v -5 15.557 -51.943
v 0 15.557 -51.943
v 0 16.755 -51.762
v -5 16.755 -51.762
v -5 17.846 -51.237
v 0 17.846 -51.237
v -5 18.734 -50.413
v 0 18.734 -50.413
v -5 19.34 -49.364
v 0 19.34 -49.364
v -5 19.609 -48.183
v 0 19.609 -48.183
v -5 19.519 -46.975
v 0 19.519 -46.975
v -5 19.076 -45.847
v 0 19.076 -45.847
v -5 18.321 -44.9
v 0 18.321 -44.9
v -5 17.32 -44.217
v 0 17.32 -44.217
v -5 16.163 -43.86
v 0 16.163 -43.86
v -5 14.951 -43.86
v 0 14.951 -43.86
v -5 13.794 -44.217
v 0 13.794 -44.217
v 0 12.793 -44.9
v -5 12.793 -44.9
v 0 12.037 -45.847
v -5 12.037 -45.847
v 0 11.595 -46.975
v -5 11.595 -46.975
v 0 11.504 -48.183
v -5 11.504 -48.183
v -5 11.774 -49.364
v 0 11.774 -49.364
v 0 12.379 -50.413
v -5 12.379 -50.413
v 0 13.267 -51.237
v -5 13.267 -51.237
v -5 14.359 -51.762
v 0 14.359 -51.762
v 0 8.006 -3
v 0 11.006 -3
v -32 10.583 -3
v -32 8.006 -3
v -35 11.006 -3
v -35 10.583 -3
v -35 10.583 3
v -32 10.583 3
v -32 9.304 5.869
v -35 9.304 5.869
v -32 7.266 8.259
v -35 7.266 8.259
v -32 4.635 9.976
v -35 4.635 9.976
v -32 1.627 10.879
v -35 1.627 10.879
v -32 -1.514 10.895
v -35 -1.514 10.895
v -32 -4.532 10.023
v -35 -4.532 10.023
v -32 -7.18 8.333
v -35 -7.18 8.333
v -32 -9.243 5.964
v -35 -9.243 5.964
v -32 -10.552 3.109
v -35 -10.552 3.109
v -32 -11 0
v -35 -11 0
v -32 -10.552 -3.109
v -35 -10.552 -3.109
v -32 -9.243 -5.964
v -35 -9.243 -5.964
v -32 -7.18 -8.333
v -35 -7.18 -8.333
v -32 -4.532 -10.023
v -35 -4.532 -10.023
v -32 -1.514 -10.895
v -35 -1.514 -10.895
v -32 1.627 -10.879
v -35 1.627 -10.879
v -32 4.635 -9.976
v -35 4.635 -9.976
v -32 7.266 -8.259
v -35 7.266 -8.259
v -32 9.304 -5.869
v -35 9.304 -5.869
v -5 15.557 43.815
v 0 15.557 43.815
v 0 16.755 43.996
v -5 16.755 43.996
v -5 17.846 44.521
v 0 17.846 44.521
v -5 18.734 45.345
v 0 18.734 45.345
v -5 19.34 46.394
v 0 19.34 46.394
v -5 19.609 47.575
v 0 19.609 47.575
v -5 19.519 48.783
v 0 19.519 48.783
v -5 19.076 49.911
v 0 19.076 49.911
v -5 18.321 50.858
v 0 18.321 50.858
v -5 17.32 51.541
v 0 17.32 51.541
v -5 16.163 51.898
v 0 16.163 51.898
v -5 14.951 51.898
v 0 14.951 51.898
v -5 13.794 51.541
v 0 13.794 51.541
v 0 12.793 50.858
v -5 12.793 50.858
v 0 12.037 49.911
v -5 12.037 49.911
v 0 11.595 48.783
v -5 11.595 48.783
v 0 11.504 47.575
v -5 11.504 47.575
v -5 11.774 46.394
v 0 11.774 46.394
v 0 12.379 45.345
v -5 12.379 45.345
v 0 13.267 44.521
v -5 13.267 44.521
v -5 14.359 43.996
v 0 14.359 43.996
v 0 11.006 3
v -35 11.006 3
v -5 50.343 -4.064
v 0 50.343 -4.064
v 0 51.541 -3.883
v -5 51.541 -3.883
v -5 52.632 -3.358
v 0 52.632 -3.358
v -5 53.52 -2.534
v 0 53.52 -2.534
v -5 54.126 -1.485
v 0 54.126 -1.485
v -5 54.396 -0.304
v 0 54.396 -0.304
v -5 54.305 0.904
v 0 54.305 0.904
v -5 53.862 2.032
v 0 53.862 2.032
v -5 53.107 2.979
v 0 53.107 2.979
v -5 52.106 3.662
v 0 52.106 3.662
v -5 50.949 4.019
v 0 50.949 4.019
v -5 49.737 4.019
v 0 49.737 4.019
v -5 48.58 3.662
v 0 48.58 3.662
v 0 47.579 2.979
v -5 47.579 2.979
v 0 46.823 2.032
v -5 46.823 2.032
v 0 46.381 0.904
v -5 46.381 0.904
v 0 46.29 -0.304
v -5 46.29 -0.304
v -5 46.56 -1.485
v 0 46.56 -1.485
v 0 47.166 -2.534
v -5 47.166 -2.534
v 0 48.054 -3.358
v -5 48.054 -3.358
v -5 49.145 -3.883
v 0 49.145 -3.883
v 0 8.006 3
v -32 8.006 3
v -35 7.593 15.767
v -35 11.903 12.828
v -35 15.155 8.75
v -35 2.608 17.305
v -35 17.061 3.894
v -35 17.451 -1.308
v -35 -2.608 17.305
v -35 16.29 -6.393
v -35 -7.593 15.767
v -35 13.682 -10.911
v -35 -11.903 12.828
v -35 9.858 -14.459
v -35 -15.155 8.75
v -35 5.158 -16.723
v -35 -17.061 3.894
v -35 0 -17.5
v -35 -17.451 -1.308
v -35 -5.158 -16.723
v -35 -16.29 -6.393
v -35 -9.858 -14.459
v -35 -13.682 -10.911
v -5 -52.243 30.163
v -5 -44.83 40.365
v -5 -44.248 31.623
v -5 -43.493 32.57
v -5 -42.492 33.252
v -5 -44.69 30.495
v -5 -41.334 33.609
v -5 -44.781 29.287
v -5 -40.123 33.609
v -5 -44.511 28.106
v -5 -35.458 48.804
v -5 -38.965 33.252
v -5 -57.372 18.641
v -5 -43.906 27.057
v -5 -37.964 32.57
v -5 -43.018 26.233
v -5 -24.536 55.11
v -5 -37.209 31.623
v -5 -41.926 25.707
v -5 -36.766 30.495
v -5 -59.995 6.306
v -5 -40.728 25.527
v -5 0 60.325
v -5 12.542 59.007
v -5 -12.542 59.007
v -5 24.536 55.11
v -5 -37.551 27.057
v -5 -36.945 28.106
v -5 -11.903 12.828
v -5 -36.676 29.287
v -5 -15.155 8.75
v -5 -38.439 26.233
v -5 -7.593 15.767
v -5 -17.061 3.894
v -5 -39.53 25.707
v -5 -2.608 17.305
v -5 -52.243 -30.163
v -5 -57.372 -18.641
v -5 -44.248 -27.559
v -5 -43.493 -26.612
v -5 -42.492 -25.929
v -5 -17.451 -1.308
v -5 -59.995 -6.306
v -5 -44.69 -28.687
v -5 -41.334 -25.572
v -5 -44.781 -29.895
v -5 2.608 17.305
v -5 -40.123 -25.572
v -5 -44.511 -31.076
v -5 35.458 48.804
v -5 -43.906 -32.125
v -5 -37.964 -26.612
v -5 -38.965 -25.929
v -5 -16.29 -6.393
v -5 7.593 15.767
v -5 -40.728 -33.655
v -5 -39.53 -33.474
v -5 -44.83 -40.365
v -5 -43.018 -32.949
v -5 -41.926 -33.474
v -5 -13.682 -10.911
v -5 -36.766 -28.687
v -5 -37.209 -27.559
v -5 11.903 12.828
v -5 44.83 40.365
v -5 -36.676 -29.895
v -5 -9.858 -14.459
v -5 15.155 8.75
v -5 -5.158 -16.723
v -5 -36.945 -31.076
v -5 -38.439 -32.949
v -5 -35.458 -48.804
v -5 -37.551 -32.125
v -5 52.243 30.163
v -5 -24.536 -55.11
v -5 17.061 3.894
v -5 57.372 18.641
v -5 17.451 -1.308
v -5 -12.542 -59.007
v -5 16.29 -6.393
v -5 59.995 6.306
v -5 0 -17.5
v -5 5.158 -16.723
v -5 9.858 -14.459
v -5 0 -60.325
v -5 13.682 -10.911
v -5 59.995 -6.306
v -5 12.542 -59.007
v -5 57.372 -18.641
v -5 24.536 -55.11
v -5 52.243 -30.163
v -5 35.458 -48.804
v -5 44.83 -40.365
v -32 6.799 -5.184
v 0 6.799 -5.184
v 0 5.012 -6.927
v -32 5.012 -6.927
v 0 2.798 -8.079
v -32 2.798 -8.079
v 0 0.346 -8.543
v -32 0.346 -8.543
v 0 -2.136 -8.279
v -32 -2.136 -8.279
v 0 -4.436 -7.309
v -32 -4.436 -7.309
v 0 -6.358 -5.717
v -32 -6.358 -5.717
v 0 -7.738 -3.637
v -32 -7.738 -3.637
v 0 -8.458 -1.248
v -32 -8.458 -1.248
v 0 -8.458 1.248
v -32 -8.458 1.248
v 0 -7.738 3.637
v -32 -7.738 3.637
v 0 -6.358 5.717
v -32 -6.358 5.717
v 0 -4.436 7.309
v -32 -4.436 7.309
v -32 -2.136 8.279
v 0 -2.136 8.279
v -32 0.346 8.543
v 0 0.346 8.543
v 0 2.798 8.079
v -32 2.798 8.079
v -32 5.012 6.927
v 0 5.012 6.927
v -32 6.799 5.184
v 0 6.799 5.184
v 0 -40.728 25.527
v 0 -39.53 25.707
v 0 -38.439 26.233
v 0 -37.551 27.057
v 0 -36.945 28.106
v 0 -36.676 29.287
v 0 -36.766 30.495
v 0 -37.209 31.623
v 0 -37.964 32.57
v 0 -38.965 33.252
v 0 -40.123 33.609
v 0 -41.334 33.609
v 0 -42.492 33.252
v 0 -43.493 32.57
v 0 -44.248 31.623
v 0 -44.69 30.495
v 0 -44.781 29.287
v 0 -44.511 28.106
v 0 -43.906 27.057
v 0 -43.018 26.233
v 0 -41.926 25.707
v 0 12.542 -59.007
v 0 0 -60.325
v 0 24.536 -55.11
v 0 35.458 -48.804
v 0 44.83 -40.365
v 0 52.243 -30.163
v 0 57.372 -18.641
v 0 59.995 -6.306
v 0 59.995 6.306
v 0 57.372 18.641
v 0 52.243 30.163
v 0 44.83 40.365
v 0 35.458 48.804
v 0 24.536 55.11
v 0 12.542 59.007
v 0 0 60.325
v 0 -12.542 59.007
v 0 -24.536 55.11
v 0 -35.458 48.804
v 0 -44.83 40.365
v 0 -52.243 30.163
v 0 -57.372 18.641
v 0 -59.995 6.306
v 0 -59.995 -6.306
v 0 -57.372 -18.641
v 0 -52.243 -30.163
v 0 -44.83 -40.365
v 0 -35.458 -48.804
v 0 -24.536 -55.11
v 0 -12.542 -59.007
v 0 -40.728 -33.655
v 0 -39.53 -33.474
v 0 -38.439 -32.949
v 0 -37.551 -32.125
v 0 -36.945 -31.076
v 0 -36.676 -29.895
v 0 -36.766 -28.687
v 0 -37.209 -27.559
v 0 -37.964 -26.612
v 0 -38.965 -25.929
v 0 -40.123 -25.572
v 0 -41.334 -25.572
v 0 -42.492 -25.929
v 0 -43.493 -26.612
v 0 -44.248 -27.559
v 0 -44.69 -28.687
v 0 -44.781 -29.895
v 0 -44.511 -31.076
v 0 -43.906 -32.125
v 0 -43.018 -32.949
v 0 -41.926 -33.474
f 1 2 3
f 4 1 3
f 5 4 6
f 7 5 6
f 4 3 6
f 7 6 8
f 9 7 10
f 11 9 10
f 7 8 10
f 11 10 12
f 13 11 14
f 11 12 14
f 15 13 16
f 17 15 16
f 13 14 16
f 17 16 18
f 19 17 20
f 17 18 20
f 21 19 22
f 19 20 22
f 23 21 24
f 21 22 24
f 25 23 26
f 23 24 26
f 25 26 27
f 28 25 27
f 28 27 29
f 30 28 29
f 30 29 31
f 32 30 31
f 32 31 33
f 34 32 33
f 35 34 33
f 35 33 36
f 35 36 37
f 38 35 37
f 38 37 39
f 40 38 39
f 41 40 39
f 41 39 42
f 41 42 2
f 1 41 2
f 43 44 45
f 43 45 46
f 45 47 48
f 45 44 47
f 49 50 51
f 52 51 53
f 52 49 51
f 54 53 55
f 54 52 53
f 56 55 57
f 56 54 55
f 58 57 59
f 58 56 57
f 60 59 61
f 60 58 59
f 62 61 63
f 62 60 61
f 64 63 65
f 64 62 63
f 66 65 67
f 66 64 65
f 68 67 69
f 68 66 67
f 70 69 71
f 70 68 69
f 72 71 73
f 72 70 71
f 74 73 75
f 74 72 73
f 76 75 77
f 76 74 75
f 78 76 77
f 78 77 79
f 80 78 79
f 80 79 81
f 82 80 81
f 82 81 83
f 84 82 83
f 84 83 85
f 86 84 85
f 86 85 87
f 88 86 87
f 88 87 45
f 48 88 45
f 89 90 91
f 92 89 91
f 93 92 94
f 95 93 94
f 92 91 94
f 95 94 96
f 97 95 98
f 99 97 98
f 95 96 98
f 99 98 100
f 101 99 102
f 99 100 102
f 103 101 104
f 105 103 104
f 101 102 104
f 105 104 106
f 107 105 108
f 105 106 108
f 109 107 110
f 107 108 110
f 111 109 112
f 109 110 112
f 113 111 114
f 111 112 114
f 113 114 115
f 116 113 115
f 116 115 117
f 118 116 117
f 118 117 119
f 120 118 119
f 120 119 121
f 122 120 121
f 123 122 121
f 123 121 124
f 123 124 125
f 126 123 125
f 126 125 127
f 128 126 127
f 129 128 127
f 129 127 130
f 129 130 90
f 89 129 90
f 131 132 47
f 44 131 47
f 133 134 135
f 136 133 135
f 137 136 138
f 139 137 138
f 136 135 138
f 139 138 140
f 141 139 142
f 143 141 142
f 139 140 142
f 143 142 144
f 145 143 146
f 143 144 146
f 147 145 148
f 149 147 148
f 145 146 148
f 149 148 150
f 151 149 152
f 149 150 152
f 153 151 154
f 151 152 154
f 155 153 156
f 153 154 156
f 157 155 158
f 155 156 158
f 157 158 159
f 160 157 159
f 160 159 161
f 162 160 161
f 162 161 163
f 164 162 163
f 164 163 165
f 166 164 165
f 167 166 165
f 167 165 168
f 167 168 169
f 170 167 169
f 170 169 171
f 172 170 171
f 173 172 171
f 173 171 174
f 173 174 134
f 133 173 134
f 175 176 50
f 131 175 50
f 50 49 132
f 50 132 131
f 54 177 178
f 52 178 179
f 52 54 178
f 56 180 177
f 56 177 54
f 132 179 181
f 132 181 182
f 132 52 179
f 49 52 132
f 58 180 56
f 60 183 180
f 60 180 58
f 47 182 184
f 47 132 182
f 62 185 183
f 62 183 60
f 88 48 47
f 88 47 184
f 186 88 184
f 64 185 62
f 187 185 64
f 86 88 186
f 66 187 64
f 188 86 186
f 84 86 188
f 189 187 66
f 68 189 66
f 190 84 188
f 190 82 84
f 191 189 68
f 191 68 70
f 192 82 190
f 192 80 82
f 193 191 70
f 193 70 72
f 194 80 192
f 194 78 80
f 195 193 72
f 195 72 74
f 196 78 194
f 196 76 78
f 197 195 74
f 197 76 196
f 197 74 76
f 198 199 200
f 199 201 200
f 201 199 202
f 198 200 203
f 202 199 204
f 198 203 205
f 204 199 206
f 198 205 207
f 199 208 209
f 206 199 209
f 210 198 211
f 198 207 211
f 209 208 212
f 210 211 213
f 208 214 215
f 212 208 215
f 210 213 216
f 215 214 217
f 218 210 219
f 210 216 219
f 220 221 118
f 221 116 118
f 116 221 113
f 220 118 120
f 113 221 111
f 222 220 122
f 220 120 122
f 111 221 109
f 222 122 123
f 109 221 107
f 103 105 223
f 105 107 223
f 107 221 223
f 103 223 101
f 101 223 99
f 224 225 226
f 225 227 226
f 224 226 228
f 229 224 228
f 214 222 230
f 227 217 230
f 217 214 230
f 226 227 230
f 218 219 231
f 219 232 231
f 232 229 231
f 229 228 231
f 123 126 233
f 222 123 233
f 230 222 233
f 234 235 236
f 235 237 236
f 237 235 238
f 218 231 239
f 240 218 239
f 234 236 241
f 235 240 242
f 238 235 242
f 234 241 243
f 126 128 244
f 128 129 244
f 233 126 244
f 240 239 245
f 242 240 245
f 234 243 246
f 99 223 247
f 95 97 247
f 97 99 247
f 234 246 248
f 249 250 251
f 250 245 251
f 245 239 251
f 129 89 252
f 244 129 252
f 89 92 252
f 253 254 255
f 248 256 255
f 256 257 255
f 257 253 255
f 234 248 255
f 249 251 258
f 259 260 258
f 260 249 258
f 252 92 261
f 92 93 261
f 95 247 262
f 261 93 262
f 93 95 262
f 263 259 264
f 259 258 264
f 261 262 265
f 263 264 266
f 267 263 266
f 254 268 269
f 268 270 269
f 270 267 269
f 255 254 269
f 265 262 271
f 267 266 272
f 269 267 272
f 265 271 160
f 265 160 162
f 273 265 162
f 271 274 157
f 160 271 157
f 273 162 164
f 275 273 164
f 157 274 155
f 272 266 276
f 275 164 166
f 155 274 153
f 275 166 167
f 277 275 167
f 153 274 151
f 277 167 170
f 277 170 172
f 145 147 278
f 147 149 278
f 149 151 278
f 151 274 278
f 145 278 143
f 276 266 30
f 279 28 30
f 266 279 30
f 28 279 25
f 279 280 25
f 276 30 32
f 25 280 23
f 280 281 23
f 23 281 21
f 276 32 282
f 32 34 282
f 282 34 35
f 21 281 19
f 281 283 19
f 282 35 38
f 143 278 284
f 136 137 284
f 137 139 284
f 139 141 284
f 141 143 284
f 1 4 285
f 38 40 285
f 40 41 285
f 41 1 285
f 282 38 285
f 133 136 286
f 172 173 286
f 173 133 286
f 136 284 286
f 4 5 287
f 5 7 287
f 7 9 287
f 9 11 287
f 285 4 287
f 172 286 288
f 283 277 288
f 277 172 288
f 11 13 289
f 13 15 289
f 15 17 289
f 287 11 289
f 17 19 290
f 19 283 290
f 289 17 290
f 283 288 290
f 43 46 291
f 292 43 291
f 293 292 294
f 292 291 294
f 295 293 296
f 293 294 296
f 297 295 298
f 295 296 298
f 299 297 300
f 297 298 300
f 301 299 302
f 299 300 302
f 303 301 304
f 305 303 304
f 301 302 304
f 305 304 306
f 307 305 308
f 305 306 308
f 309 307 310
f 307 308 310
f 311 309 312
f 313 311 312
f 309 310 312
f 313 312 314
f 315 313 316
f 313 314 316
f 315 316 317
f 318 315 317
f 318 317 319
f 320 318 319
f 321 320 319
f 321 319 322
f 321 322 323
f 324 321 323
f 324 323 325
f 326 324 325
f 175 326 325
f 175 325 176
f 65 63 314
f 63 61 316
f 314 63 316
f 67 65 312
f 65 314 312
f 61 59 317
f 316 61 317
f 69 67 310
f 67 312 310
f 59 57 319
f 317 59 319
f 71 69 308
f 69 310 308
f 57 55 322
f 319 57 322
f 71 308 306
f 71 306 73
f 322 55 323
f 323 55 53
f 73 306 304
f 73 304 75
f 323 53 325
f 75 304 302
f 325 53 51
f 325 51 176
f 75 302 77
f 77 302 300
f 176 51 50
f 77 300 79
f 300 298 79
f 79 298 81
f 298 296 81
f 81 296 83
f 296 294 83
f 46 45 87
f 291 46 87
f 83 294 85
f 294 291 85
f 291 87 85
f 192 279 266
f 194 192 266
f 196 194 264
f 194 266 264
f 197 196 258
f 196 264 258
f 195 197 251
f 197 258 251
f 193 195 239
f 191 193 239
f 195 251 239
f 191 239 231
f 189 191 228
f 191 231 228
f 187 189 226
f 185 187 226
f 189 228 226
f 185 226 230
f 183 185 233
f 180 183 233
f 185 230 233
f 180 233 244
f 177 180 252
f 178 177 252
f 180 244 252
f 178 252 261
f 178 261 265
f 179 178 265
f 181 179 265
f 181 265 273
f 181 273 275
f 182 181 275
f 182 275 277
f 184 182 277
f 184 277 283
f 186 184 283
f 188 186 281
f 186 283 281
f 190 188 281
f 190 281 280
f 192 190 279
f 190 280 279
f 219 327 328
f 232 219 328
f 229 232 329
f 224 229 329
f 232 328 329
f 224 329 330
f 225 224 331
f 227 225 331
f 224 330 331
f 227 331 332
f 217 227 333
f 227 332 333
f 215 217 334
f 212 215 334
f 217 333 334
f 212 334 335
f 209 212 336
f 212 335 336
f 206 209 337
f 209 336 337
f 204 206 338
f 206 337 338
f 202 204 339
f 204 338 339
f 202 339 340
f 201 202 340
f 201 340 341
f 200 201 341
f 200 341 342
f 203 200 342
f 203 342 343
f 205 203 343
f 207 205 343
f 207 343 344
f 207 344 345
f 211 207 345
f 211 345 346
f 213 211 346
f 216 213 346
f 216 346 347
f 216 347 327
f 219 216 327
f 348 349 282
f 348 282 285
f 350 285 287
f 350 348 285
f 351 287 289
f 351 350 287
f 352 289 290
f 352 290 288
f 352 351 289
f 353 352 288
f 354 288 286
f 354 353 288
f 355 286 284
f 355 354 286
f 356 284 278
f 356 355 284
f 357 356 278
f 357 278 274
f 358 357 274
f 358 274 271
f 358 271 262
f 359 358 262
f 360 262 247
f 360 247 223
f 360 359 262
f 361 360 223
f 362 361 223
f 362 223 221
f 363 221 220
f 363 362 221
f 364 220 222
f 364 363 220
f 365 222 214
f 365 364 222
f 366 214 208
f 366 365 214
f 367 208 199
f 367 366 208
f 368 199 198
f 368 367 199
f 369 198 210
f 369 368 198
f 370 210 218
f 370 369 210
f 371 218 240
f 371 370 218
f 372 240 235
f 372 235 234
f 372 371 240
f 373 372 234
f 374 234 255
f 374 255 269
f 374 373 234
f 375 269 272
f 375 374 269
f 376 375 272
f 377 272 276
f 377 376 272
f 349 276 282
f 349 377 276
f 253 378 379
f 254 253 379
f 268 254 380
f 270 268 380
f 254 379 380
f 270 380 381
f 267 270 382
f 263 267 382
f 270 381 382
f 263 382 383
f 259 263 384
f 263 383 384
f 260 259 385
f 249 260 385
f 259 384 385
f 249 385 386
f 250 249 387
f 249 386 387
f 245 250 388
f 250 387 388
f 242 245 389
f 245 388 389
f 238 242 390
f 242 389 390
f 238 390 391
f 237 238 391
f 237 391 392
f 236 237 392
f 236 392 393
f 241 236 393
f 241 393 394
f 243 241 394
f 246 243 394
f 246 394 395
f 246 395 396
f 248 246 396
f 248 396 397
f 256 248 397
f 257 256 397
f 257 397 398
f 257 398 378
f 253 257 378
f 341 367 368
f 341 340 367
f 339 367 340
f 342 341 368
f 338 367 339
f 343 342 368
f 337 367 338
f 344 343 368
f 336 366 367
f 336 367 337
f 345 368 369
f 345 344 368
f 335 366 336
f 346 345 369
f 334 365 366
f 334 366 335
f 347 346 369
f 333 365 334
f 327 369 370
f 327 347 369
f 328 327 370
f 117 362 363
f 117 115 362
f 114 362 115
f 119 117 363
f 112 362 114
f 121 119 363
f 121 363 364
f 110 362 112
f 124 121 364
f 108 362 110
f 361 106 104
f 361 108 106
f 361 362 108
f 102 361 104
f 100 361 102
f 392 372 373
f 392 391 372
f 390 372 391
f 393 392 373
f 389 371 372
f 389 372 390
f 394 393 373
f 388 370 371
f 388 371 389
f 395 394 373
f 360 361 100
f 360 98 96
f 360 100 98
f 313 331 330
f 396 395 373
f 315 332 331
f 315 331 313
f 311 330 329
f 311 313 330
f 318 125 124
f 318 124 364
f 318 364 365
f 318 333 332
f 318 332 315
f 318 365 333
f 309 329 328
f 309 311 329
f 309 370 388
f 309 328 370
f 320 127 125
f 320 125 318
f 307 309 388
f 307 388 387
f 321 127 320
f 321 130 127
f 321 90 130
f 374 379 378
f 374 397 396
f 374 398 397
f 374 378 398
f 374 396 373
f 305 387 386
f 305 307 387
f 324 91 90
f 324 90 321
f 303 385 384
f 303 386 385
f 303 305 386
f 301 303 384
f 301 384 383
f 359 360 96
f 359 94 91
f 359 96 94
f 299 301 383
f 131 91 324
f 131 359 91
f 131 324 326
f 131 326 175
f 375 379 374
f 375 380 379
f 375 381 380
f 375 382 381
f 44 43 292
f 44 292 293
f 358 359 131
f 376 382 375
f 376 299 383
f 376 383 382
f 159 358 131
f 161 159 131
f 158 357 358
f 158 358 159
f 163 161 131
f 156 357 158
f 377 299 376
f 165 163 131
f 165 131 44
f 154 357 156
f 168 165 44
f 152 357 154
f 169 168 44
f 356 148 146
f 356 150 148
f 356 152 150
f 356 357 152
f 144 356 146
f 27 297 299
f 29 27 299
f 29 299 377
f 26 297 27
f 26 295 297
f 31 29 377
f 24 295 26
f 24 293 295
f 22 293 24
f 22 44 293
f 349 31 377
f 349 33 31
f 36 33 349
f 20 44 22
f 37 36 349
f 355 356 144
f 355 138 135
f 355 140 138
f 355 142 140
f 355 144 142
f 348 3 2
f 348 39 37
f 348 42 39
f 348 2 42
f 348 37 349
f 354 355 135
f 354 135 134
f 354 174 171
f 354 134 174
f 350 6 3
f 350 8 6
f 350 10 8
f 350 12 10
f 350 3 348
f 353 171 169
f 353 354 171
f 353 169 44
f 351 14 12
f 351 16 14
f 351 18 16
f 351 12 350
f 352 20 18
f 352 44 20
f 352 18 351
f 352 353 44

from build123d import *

# Parameters (mm, degrees)
SKETCH1_R                           = 60.325
BOSS_EXTRUDE1_DEPTH                 = 5
SKETCH2_R                           = 4.064
CUT_EXTRUDE1_DEPTH                  = 86.458827806
SKETCH11_R                          = 17.5
BOSS_EXTRUDE3_DEPTH                 = 30
CUT_EXTRUDE5_DEPTH                  = 93.212858377
SKETCH13_R                          = 11
CUT_MOTORSHOULDERRECESS_D22X3_DEPTH = 3


with BuildPart() as part:
    # Sketch1 → Boss-Extrude1 (new body)
    with BuildSketch(Plane(origin=(0, 0, 0), x_dir=(0, 0, -1), z_dir=(1, 0, 0))):
        Circle(SKETCH1_R)
    extrude(amount=-BOSS_EXTRUDE1_DEPTH)

    # Sketch2 → Cut-Extrude1 (cut, through all)
    with BuildSketch(Plane(origin=(0, 0, 0), x_dir=(0, 0, -1), z_dir=(1, 0, 0))):
        with Locations((0, 50.342959834)):
            Circle(SKETCH2_R)
        with Locations((47.879, 15.556830136)):
            Circle(SKETCH2_R)
        with Locations((29.590849347, -40.728310053)):
            Circle(SKETCH2_R)
        with Locations((-29.590849347, -40.728310053)):
            Circle(SKETCH2_R)
        with Locations((-47.879, 15.556830136)):
            Circle(SKETCH2_R)
    extrude(amount=-CUT_EXTRUDE1_DEPTH, mode=Mode.SUBTRACT)

    # Sketch11 → Boss-Extrude3 (add)
    with BuildSketch(Plane.ZY.offset(5)):
        with Locations(Location((0, 0, 0), (0, 0, 180))):
            Circle(SKETCH11_R)
    extrude(amount=BOSS_EXTRUDE3_DEPTH)

    # Sketch12 → Cut-Extrude5 (cut, through all)
    with BuildSketch(Plane.ZY.offset(35)):
        with BuildLine():
            Line((0, 11.006403687), (-3, 11.006403687))
            Line((-3, 11.006403687), (-3, 8.006403687))
            ThreePointArc((-3, 8.006403687), (0, -8.55), (3, 8.006403687))
            Line((3, 8.006403687), (3, 11.006403687))
            Line((3, 11.006403687), (0, 11.006403687))
        make_face()
    extrude(amount=-CUT_EXTRUDE5_DEPTH, mode=Mode.SUBTRACT)

    # Sketch13 → Cut_MotorShoulderRecess_D22x3 (cut)
    with BuildSketch(Plane(origin=(-35, 0, 0), x_dir=(0, 0, -1), z_dir=(1, 0, 0))):
        Circle(SKETCH13_R)
    extrude(amount=CUT_MOTORSHOULDERRECESS_D22X3_DEPTH, mode=Mode.SUBTRACT)


solid = part.part
